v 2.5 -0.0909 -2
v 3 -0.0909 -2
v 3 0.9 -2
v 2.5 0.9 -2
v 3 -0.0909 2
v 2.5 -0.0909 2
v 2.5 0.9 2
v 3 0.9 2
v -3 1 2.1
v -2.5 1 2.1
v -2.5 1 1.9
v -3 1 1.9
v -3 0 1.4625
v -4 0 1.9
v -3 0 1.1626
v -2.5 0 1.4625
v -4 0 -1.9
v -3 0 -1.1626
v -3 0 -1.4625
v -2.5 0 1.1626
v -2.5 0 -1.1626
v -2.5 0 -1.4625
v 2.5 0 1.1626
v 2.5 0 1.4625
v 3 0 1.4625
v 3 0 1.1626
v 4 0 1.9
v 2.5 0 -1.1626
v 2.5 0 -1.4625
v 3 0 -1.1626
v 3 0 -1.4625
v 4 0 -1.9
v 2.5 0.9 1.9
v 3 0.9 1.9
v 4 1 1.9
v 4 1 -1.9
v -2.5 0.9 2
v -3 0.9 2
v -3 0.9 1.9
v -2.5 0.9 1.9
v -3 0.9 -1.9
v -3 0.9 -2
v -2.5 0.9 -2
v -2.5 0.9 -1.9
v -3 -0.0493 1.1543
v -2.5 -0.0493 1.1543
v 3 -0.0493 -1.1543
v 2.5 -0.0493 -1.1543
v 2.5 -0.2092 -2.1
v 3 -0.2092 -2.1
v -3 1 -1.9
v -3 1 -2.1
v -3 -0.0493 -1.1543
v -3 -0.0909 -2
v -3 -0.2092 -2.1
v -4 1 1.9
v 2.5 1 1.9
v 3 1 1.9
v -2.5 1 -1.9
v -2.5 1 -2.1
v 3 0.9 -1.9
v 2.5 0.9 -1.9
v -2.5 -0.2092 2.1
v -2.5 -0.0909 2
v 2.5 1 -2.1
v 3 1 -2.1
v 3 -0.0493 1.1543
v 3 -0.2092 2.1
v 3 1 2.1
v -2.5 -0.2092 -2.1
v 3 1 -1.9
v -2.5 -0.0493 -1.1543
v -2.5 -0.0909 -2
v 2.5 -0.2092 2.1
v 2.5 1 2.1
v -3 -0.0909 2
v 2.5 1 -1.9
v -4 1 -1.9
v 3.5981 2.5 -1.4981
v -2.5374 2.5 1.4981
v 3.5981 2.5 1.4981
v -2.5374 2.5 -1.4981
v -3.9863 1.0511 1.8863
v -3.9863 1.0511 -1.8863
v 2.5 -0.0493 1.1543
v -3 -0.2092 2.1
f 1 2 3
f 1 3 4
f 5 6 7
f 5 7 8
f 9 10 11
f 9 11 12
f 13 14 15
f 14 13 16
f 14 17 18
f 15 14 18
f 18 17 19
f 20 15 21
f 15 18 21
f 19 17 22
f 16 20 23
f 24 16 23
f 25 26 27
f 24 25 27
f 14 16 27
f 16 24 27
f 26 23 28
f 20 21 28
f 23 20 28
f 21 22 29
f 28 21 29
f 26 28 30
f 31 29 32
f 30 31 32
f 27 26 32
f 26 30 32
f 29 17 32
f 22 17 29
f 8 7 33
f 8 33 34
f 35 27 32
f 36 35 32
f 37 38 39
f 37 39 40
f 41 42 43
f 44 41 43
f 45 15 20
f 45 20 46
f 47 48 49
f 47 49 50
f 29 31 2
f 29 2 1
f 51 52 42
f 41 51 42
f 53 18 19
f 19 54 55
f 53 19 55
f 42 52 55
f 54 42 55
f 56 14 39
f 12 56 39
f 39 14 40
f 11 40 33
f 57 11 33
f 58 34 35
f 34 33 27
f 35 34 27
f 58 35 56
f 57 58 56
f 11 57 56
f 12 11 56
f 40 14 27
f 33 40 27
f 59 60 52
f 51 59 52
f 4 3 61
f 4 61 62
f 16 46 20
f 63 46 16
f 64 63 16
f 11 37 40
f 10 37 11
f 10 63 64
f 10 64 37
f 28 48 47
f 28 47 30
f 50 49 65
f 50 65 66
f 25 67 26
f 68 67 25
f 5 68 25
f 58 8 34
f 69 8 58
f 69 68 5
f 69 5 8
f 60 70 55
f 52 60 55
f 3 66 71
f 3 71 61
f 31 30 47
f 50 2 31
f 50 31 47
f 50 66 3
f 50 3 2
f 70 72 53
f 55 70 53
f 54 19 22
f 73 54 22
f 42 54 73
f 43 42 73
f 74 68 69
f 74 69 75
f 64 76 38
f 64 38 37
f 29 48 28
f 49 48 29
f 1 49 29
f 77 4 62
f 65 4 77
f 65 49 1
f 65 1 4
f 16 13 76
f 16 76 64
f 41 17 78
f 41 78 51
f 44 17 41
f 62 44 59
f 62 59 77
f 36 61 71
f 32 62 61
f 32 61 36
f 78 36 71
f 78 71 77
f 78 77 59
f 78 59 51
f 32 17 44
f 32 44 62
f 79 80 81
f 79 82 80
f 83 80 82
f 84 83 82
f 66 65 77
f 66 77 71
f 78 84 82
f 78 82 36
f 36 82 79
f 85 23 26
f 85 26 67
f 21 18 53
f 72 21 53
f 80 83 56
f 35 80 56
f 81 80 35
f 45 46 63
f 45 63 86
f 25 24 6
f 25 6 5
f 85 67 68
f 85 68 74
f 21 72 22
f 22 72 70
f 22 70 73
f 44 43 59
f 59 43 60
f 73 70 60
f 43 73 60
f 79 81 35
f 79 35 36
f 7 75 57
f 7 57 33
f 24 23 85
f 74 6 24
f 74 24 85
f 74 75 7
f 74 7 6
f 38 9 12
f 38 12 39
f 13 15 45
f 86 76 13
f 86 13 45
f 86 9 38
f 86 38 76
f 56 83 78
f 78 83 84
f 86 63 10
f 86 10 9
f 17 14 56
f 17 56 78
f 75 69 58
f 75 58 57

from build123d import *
from OCP.BRepFilletAPI import BRepFilletAPI_MakeChamfer

# Parameters (mm, degrees)
SKETCH1_W               = 8
SKETCH1_H               = 3.8
BOSS_EXTRUDE1_DEPTH     = 2.5
CHAMFER1_SIZE           = 1.5
CHAMFER1_SIZE2          = 0.401923789
CHAMFER2_SIZE           = 1.5
CHAMFER2_SIZE2          = 1.060660172
SKETCH2_W               = 0.5
SKETCH2_H               = 0.1
LPATTERN1_COUNT         = 2
LPATTERN1_PITCH         = 5.5
MIRROR1_COPY_1_SKETCH_W = 0.5
MIRROR1_COPY_1_SKETCH_H = 0.1
MIRROR1_COPY_2_SKETCH_W = 0.5
MIRROR1_COPY_2_SKETCH_H = 0.1


with BuildPart() as part:
    # Sketch1 → Boss-Extrude1 (new body)
    with BuildSketch(Plane(origin=(0, 0, 0), x_dir=(1, 0, 0), z_dir=(0, 1, 0))):
        Rectangle(SKETCH1_W, SKETCH1_H)
    extrude(amount=BOSS_EXTRUDE1_DEPTH)

    # Chamfer1: one chamfer whose edges measure the first distance from different faces: ONE call of the kernel's chamfer builder (chamfer() names one face for all edges)
    chamfer1_edges_1 = [part.edges().sort_by_distance(p)[0] for p in [
        (-4, 2.5, 0),
    ]]
    chamfer1_side_1 = [part.faces().sort_by_distance(p)[0] for p in [
        (-4, 1.25, 0),
    ]]
    chamfer1_edges_2 = [part.edges().sort_by_distance(p)[0] for p in [
        (0, 2.5, -1.9),
    ]]
    chamfer1_side_2 = [part.faces().sort_by_distance(p)[0] for p in [
        (0, 1.25, -1.9),
    ]]
    chamfer1_edges_3 = [part.edges().sort_by_distance(p)[0] for p in [
        (4, 2.5, 0),
    ]]
    chamfer1_side_3 = [part.faces().sort_by_distance(p)[0] for p in [
        (4, 1.25, 0),
    ]]
    chamfer1_edges_4 = [part.edges().sort_by_distance(p)[0] for p in [
        (0, 2.5, 1.9),
    ]]
    chamfer1_side_4 = [part.faces().sort_by_distance(p)[0] for p in [
        (0, 1.25, 1.9),
    ]]
    chamfer1 = BRepFilletAPI_MakeChamfer(part.part.solid().wrapped)
    for e in chamfer1_edges_1:
        chamfer1.Add(CHAMFER1_SIZE, CHAMFER1_SIZE2, e.wrapped, chamfer1_side_1[0].wrapped)  # the first distance lies on this face
    for e in chamfer1_edges_2:
        chamfer1.Add(CHAMFER1_SIZE, CHAMFER1_SIZE2, e.wrapped, chamfer1_side_2[0].wrapped)  # the first distance lies on this face
    for e in chamfer1_edges_3:
        chamfer1.Add(CHAMFER1_SIZE, CHAMFER1_SIZE2, e.wrapped, chamfer1_side_3[0].wrapped)  # the first distance lies on this face
    for e in chamfer1_edges_4:
        chamfer1.Add(CHAMFER1_SIZE, CHAMFER1_SIZE2, e.wrapped, chamfer1_side_4[0].wrapped)  # the first distance lies on this face
    add(Compound.cast(chamfer1.Shape()), mode=Mode.REPLACE)

    # Chamfer2
    chamfer2_edges = [part.edges().sort_by_distance(p)[0] for p in [
        (-3.598076211, 2.5, 0),
    ]]
    chamfer2_side = [part.faces().sort_by_distance(p)[0] for p in [
        (-3.80696135, 1.720430049, 0),
    ]]
    chamfer(chamfer2_edges, length=CHAMFER2_SIZE, length2=CHAMFER2_SIZE2, reference=chamfer2_side[0])

    # Sweep1: sweep along a path in Sketch3
    with BuildLine(Plane(origin=(-2.75, 0, 0), x_dir=(0, 0, -1), z_dir=(1, 0, 0))) as sweep1_path:
        Line((-1.9, 0.949951684), (-2.05, 0.949951684))
        Line((-2.05, 0.949951684), (-2.05, -0.150048316))
        Line((-2.05, -0.150048316), (-1.162596201, 0))
    # Sketch2 → Sweep1 (sweep)
    with BuildSketch(Plane.XY.offset(1.9)):
        with Locations((-2.75, 0.949951684)):
            Rectangle(SKETCH2_W, SKETCH2_H)
    sweep1 = sweep(path=sweep1_path.line, transition=Transition.RIGHT)

    # LPattern1: Sweep1 ×2
    with Locations(*[(i * LPATTERN1_PITCH, 0, 0) for i in range(1, LPATTERN1_COUNT)]):
        add(sweep1)

    # Mirror1 copy 1: sweep along a path in Mirror1 copy 1 path
    with BuildLine(Plane(origin=(2.75, 0, 0), x_dir=(0, 0, 1), z_dir=(1, 0, 0))) as mirror1_copy_1_path:
        Line((-1.9, -0.949951684), (-2.05, -0.949951684))
        Line((-2.05, -0.949951684), (-2.05, 0.150048316))
        Line((-2.05, 0.150048316), (-1.162596201, 0))
    # Mirror1 copy 1 sketch → Mirror1 copy 1 (sweep)
    with BuildSketch(Plane(origin=(5.5, 0, -1.9), x_dir=(1, 0, 0), z_dir=(0, 0, -1))):
        with Locations((-2.75, -0.949951684)):
            Rectangle(MIRROR1_COPY_1_SKETCH_W, MIRROR1_COPY_1_SKETCH_H)
    sweep(path=mirror1_copy_1_path.line, transition=Transition.RIGHT)

    # Mirror1 copy 2: sweep along a path in Mirror1 copy 2 path
    with BuildLine(Plane(origin=(-2.75, 0, 0), x_dir=(0, 0, 1), z_dir=(1, 0, 0))) as mirror1_copy_2_path:
        Line((-1.9, -0.949951684), (-2.05, -0.949951684))
        Line((-2.05, -0.949951684), (-2.05, 0.150048316))
        Line((-2.05, 0.150048316), (-1.162596201, 0))
    # Mirror1 copy 2 sketch → Mirror1 copy 2 (sweep)
    with BuildSketch(Plane(origin=(0, 0, -1.9), x_dir=(1, 0, 0), z_dir=(0, 0, -1))):
        with Locations((-2.75, -0.949951684)):
            Rectangle(MIRROR1_COPY_2_SKETCH_W, MIRROR1_COPY_2_SKETCH_H)
    sweep(path=mirror1_copy_2_path.line, transition=Transition.RIGHT)


solid = part.part
